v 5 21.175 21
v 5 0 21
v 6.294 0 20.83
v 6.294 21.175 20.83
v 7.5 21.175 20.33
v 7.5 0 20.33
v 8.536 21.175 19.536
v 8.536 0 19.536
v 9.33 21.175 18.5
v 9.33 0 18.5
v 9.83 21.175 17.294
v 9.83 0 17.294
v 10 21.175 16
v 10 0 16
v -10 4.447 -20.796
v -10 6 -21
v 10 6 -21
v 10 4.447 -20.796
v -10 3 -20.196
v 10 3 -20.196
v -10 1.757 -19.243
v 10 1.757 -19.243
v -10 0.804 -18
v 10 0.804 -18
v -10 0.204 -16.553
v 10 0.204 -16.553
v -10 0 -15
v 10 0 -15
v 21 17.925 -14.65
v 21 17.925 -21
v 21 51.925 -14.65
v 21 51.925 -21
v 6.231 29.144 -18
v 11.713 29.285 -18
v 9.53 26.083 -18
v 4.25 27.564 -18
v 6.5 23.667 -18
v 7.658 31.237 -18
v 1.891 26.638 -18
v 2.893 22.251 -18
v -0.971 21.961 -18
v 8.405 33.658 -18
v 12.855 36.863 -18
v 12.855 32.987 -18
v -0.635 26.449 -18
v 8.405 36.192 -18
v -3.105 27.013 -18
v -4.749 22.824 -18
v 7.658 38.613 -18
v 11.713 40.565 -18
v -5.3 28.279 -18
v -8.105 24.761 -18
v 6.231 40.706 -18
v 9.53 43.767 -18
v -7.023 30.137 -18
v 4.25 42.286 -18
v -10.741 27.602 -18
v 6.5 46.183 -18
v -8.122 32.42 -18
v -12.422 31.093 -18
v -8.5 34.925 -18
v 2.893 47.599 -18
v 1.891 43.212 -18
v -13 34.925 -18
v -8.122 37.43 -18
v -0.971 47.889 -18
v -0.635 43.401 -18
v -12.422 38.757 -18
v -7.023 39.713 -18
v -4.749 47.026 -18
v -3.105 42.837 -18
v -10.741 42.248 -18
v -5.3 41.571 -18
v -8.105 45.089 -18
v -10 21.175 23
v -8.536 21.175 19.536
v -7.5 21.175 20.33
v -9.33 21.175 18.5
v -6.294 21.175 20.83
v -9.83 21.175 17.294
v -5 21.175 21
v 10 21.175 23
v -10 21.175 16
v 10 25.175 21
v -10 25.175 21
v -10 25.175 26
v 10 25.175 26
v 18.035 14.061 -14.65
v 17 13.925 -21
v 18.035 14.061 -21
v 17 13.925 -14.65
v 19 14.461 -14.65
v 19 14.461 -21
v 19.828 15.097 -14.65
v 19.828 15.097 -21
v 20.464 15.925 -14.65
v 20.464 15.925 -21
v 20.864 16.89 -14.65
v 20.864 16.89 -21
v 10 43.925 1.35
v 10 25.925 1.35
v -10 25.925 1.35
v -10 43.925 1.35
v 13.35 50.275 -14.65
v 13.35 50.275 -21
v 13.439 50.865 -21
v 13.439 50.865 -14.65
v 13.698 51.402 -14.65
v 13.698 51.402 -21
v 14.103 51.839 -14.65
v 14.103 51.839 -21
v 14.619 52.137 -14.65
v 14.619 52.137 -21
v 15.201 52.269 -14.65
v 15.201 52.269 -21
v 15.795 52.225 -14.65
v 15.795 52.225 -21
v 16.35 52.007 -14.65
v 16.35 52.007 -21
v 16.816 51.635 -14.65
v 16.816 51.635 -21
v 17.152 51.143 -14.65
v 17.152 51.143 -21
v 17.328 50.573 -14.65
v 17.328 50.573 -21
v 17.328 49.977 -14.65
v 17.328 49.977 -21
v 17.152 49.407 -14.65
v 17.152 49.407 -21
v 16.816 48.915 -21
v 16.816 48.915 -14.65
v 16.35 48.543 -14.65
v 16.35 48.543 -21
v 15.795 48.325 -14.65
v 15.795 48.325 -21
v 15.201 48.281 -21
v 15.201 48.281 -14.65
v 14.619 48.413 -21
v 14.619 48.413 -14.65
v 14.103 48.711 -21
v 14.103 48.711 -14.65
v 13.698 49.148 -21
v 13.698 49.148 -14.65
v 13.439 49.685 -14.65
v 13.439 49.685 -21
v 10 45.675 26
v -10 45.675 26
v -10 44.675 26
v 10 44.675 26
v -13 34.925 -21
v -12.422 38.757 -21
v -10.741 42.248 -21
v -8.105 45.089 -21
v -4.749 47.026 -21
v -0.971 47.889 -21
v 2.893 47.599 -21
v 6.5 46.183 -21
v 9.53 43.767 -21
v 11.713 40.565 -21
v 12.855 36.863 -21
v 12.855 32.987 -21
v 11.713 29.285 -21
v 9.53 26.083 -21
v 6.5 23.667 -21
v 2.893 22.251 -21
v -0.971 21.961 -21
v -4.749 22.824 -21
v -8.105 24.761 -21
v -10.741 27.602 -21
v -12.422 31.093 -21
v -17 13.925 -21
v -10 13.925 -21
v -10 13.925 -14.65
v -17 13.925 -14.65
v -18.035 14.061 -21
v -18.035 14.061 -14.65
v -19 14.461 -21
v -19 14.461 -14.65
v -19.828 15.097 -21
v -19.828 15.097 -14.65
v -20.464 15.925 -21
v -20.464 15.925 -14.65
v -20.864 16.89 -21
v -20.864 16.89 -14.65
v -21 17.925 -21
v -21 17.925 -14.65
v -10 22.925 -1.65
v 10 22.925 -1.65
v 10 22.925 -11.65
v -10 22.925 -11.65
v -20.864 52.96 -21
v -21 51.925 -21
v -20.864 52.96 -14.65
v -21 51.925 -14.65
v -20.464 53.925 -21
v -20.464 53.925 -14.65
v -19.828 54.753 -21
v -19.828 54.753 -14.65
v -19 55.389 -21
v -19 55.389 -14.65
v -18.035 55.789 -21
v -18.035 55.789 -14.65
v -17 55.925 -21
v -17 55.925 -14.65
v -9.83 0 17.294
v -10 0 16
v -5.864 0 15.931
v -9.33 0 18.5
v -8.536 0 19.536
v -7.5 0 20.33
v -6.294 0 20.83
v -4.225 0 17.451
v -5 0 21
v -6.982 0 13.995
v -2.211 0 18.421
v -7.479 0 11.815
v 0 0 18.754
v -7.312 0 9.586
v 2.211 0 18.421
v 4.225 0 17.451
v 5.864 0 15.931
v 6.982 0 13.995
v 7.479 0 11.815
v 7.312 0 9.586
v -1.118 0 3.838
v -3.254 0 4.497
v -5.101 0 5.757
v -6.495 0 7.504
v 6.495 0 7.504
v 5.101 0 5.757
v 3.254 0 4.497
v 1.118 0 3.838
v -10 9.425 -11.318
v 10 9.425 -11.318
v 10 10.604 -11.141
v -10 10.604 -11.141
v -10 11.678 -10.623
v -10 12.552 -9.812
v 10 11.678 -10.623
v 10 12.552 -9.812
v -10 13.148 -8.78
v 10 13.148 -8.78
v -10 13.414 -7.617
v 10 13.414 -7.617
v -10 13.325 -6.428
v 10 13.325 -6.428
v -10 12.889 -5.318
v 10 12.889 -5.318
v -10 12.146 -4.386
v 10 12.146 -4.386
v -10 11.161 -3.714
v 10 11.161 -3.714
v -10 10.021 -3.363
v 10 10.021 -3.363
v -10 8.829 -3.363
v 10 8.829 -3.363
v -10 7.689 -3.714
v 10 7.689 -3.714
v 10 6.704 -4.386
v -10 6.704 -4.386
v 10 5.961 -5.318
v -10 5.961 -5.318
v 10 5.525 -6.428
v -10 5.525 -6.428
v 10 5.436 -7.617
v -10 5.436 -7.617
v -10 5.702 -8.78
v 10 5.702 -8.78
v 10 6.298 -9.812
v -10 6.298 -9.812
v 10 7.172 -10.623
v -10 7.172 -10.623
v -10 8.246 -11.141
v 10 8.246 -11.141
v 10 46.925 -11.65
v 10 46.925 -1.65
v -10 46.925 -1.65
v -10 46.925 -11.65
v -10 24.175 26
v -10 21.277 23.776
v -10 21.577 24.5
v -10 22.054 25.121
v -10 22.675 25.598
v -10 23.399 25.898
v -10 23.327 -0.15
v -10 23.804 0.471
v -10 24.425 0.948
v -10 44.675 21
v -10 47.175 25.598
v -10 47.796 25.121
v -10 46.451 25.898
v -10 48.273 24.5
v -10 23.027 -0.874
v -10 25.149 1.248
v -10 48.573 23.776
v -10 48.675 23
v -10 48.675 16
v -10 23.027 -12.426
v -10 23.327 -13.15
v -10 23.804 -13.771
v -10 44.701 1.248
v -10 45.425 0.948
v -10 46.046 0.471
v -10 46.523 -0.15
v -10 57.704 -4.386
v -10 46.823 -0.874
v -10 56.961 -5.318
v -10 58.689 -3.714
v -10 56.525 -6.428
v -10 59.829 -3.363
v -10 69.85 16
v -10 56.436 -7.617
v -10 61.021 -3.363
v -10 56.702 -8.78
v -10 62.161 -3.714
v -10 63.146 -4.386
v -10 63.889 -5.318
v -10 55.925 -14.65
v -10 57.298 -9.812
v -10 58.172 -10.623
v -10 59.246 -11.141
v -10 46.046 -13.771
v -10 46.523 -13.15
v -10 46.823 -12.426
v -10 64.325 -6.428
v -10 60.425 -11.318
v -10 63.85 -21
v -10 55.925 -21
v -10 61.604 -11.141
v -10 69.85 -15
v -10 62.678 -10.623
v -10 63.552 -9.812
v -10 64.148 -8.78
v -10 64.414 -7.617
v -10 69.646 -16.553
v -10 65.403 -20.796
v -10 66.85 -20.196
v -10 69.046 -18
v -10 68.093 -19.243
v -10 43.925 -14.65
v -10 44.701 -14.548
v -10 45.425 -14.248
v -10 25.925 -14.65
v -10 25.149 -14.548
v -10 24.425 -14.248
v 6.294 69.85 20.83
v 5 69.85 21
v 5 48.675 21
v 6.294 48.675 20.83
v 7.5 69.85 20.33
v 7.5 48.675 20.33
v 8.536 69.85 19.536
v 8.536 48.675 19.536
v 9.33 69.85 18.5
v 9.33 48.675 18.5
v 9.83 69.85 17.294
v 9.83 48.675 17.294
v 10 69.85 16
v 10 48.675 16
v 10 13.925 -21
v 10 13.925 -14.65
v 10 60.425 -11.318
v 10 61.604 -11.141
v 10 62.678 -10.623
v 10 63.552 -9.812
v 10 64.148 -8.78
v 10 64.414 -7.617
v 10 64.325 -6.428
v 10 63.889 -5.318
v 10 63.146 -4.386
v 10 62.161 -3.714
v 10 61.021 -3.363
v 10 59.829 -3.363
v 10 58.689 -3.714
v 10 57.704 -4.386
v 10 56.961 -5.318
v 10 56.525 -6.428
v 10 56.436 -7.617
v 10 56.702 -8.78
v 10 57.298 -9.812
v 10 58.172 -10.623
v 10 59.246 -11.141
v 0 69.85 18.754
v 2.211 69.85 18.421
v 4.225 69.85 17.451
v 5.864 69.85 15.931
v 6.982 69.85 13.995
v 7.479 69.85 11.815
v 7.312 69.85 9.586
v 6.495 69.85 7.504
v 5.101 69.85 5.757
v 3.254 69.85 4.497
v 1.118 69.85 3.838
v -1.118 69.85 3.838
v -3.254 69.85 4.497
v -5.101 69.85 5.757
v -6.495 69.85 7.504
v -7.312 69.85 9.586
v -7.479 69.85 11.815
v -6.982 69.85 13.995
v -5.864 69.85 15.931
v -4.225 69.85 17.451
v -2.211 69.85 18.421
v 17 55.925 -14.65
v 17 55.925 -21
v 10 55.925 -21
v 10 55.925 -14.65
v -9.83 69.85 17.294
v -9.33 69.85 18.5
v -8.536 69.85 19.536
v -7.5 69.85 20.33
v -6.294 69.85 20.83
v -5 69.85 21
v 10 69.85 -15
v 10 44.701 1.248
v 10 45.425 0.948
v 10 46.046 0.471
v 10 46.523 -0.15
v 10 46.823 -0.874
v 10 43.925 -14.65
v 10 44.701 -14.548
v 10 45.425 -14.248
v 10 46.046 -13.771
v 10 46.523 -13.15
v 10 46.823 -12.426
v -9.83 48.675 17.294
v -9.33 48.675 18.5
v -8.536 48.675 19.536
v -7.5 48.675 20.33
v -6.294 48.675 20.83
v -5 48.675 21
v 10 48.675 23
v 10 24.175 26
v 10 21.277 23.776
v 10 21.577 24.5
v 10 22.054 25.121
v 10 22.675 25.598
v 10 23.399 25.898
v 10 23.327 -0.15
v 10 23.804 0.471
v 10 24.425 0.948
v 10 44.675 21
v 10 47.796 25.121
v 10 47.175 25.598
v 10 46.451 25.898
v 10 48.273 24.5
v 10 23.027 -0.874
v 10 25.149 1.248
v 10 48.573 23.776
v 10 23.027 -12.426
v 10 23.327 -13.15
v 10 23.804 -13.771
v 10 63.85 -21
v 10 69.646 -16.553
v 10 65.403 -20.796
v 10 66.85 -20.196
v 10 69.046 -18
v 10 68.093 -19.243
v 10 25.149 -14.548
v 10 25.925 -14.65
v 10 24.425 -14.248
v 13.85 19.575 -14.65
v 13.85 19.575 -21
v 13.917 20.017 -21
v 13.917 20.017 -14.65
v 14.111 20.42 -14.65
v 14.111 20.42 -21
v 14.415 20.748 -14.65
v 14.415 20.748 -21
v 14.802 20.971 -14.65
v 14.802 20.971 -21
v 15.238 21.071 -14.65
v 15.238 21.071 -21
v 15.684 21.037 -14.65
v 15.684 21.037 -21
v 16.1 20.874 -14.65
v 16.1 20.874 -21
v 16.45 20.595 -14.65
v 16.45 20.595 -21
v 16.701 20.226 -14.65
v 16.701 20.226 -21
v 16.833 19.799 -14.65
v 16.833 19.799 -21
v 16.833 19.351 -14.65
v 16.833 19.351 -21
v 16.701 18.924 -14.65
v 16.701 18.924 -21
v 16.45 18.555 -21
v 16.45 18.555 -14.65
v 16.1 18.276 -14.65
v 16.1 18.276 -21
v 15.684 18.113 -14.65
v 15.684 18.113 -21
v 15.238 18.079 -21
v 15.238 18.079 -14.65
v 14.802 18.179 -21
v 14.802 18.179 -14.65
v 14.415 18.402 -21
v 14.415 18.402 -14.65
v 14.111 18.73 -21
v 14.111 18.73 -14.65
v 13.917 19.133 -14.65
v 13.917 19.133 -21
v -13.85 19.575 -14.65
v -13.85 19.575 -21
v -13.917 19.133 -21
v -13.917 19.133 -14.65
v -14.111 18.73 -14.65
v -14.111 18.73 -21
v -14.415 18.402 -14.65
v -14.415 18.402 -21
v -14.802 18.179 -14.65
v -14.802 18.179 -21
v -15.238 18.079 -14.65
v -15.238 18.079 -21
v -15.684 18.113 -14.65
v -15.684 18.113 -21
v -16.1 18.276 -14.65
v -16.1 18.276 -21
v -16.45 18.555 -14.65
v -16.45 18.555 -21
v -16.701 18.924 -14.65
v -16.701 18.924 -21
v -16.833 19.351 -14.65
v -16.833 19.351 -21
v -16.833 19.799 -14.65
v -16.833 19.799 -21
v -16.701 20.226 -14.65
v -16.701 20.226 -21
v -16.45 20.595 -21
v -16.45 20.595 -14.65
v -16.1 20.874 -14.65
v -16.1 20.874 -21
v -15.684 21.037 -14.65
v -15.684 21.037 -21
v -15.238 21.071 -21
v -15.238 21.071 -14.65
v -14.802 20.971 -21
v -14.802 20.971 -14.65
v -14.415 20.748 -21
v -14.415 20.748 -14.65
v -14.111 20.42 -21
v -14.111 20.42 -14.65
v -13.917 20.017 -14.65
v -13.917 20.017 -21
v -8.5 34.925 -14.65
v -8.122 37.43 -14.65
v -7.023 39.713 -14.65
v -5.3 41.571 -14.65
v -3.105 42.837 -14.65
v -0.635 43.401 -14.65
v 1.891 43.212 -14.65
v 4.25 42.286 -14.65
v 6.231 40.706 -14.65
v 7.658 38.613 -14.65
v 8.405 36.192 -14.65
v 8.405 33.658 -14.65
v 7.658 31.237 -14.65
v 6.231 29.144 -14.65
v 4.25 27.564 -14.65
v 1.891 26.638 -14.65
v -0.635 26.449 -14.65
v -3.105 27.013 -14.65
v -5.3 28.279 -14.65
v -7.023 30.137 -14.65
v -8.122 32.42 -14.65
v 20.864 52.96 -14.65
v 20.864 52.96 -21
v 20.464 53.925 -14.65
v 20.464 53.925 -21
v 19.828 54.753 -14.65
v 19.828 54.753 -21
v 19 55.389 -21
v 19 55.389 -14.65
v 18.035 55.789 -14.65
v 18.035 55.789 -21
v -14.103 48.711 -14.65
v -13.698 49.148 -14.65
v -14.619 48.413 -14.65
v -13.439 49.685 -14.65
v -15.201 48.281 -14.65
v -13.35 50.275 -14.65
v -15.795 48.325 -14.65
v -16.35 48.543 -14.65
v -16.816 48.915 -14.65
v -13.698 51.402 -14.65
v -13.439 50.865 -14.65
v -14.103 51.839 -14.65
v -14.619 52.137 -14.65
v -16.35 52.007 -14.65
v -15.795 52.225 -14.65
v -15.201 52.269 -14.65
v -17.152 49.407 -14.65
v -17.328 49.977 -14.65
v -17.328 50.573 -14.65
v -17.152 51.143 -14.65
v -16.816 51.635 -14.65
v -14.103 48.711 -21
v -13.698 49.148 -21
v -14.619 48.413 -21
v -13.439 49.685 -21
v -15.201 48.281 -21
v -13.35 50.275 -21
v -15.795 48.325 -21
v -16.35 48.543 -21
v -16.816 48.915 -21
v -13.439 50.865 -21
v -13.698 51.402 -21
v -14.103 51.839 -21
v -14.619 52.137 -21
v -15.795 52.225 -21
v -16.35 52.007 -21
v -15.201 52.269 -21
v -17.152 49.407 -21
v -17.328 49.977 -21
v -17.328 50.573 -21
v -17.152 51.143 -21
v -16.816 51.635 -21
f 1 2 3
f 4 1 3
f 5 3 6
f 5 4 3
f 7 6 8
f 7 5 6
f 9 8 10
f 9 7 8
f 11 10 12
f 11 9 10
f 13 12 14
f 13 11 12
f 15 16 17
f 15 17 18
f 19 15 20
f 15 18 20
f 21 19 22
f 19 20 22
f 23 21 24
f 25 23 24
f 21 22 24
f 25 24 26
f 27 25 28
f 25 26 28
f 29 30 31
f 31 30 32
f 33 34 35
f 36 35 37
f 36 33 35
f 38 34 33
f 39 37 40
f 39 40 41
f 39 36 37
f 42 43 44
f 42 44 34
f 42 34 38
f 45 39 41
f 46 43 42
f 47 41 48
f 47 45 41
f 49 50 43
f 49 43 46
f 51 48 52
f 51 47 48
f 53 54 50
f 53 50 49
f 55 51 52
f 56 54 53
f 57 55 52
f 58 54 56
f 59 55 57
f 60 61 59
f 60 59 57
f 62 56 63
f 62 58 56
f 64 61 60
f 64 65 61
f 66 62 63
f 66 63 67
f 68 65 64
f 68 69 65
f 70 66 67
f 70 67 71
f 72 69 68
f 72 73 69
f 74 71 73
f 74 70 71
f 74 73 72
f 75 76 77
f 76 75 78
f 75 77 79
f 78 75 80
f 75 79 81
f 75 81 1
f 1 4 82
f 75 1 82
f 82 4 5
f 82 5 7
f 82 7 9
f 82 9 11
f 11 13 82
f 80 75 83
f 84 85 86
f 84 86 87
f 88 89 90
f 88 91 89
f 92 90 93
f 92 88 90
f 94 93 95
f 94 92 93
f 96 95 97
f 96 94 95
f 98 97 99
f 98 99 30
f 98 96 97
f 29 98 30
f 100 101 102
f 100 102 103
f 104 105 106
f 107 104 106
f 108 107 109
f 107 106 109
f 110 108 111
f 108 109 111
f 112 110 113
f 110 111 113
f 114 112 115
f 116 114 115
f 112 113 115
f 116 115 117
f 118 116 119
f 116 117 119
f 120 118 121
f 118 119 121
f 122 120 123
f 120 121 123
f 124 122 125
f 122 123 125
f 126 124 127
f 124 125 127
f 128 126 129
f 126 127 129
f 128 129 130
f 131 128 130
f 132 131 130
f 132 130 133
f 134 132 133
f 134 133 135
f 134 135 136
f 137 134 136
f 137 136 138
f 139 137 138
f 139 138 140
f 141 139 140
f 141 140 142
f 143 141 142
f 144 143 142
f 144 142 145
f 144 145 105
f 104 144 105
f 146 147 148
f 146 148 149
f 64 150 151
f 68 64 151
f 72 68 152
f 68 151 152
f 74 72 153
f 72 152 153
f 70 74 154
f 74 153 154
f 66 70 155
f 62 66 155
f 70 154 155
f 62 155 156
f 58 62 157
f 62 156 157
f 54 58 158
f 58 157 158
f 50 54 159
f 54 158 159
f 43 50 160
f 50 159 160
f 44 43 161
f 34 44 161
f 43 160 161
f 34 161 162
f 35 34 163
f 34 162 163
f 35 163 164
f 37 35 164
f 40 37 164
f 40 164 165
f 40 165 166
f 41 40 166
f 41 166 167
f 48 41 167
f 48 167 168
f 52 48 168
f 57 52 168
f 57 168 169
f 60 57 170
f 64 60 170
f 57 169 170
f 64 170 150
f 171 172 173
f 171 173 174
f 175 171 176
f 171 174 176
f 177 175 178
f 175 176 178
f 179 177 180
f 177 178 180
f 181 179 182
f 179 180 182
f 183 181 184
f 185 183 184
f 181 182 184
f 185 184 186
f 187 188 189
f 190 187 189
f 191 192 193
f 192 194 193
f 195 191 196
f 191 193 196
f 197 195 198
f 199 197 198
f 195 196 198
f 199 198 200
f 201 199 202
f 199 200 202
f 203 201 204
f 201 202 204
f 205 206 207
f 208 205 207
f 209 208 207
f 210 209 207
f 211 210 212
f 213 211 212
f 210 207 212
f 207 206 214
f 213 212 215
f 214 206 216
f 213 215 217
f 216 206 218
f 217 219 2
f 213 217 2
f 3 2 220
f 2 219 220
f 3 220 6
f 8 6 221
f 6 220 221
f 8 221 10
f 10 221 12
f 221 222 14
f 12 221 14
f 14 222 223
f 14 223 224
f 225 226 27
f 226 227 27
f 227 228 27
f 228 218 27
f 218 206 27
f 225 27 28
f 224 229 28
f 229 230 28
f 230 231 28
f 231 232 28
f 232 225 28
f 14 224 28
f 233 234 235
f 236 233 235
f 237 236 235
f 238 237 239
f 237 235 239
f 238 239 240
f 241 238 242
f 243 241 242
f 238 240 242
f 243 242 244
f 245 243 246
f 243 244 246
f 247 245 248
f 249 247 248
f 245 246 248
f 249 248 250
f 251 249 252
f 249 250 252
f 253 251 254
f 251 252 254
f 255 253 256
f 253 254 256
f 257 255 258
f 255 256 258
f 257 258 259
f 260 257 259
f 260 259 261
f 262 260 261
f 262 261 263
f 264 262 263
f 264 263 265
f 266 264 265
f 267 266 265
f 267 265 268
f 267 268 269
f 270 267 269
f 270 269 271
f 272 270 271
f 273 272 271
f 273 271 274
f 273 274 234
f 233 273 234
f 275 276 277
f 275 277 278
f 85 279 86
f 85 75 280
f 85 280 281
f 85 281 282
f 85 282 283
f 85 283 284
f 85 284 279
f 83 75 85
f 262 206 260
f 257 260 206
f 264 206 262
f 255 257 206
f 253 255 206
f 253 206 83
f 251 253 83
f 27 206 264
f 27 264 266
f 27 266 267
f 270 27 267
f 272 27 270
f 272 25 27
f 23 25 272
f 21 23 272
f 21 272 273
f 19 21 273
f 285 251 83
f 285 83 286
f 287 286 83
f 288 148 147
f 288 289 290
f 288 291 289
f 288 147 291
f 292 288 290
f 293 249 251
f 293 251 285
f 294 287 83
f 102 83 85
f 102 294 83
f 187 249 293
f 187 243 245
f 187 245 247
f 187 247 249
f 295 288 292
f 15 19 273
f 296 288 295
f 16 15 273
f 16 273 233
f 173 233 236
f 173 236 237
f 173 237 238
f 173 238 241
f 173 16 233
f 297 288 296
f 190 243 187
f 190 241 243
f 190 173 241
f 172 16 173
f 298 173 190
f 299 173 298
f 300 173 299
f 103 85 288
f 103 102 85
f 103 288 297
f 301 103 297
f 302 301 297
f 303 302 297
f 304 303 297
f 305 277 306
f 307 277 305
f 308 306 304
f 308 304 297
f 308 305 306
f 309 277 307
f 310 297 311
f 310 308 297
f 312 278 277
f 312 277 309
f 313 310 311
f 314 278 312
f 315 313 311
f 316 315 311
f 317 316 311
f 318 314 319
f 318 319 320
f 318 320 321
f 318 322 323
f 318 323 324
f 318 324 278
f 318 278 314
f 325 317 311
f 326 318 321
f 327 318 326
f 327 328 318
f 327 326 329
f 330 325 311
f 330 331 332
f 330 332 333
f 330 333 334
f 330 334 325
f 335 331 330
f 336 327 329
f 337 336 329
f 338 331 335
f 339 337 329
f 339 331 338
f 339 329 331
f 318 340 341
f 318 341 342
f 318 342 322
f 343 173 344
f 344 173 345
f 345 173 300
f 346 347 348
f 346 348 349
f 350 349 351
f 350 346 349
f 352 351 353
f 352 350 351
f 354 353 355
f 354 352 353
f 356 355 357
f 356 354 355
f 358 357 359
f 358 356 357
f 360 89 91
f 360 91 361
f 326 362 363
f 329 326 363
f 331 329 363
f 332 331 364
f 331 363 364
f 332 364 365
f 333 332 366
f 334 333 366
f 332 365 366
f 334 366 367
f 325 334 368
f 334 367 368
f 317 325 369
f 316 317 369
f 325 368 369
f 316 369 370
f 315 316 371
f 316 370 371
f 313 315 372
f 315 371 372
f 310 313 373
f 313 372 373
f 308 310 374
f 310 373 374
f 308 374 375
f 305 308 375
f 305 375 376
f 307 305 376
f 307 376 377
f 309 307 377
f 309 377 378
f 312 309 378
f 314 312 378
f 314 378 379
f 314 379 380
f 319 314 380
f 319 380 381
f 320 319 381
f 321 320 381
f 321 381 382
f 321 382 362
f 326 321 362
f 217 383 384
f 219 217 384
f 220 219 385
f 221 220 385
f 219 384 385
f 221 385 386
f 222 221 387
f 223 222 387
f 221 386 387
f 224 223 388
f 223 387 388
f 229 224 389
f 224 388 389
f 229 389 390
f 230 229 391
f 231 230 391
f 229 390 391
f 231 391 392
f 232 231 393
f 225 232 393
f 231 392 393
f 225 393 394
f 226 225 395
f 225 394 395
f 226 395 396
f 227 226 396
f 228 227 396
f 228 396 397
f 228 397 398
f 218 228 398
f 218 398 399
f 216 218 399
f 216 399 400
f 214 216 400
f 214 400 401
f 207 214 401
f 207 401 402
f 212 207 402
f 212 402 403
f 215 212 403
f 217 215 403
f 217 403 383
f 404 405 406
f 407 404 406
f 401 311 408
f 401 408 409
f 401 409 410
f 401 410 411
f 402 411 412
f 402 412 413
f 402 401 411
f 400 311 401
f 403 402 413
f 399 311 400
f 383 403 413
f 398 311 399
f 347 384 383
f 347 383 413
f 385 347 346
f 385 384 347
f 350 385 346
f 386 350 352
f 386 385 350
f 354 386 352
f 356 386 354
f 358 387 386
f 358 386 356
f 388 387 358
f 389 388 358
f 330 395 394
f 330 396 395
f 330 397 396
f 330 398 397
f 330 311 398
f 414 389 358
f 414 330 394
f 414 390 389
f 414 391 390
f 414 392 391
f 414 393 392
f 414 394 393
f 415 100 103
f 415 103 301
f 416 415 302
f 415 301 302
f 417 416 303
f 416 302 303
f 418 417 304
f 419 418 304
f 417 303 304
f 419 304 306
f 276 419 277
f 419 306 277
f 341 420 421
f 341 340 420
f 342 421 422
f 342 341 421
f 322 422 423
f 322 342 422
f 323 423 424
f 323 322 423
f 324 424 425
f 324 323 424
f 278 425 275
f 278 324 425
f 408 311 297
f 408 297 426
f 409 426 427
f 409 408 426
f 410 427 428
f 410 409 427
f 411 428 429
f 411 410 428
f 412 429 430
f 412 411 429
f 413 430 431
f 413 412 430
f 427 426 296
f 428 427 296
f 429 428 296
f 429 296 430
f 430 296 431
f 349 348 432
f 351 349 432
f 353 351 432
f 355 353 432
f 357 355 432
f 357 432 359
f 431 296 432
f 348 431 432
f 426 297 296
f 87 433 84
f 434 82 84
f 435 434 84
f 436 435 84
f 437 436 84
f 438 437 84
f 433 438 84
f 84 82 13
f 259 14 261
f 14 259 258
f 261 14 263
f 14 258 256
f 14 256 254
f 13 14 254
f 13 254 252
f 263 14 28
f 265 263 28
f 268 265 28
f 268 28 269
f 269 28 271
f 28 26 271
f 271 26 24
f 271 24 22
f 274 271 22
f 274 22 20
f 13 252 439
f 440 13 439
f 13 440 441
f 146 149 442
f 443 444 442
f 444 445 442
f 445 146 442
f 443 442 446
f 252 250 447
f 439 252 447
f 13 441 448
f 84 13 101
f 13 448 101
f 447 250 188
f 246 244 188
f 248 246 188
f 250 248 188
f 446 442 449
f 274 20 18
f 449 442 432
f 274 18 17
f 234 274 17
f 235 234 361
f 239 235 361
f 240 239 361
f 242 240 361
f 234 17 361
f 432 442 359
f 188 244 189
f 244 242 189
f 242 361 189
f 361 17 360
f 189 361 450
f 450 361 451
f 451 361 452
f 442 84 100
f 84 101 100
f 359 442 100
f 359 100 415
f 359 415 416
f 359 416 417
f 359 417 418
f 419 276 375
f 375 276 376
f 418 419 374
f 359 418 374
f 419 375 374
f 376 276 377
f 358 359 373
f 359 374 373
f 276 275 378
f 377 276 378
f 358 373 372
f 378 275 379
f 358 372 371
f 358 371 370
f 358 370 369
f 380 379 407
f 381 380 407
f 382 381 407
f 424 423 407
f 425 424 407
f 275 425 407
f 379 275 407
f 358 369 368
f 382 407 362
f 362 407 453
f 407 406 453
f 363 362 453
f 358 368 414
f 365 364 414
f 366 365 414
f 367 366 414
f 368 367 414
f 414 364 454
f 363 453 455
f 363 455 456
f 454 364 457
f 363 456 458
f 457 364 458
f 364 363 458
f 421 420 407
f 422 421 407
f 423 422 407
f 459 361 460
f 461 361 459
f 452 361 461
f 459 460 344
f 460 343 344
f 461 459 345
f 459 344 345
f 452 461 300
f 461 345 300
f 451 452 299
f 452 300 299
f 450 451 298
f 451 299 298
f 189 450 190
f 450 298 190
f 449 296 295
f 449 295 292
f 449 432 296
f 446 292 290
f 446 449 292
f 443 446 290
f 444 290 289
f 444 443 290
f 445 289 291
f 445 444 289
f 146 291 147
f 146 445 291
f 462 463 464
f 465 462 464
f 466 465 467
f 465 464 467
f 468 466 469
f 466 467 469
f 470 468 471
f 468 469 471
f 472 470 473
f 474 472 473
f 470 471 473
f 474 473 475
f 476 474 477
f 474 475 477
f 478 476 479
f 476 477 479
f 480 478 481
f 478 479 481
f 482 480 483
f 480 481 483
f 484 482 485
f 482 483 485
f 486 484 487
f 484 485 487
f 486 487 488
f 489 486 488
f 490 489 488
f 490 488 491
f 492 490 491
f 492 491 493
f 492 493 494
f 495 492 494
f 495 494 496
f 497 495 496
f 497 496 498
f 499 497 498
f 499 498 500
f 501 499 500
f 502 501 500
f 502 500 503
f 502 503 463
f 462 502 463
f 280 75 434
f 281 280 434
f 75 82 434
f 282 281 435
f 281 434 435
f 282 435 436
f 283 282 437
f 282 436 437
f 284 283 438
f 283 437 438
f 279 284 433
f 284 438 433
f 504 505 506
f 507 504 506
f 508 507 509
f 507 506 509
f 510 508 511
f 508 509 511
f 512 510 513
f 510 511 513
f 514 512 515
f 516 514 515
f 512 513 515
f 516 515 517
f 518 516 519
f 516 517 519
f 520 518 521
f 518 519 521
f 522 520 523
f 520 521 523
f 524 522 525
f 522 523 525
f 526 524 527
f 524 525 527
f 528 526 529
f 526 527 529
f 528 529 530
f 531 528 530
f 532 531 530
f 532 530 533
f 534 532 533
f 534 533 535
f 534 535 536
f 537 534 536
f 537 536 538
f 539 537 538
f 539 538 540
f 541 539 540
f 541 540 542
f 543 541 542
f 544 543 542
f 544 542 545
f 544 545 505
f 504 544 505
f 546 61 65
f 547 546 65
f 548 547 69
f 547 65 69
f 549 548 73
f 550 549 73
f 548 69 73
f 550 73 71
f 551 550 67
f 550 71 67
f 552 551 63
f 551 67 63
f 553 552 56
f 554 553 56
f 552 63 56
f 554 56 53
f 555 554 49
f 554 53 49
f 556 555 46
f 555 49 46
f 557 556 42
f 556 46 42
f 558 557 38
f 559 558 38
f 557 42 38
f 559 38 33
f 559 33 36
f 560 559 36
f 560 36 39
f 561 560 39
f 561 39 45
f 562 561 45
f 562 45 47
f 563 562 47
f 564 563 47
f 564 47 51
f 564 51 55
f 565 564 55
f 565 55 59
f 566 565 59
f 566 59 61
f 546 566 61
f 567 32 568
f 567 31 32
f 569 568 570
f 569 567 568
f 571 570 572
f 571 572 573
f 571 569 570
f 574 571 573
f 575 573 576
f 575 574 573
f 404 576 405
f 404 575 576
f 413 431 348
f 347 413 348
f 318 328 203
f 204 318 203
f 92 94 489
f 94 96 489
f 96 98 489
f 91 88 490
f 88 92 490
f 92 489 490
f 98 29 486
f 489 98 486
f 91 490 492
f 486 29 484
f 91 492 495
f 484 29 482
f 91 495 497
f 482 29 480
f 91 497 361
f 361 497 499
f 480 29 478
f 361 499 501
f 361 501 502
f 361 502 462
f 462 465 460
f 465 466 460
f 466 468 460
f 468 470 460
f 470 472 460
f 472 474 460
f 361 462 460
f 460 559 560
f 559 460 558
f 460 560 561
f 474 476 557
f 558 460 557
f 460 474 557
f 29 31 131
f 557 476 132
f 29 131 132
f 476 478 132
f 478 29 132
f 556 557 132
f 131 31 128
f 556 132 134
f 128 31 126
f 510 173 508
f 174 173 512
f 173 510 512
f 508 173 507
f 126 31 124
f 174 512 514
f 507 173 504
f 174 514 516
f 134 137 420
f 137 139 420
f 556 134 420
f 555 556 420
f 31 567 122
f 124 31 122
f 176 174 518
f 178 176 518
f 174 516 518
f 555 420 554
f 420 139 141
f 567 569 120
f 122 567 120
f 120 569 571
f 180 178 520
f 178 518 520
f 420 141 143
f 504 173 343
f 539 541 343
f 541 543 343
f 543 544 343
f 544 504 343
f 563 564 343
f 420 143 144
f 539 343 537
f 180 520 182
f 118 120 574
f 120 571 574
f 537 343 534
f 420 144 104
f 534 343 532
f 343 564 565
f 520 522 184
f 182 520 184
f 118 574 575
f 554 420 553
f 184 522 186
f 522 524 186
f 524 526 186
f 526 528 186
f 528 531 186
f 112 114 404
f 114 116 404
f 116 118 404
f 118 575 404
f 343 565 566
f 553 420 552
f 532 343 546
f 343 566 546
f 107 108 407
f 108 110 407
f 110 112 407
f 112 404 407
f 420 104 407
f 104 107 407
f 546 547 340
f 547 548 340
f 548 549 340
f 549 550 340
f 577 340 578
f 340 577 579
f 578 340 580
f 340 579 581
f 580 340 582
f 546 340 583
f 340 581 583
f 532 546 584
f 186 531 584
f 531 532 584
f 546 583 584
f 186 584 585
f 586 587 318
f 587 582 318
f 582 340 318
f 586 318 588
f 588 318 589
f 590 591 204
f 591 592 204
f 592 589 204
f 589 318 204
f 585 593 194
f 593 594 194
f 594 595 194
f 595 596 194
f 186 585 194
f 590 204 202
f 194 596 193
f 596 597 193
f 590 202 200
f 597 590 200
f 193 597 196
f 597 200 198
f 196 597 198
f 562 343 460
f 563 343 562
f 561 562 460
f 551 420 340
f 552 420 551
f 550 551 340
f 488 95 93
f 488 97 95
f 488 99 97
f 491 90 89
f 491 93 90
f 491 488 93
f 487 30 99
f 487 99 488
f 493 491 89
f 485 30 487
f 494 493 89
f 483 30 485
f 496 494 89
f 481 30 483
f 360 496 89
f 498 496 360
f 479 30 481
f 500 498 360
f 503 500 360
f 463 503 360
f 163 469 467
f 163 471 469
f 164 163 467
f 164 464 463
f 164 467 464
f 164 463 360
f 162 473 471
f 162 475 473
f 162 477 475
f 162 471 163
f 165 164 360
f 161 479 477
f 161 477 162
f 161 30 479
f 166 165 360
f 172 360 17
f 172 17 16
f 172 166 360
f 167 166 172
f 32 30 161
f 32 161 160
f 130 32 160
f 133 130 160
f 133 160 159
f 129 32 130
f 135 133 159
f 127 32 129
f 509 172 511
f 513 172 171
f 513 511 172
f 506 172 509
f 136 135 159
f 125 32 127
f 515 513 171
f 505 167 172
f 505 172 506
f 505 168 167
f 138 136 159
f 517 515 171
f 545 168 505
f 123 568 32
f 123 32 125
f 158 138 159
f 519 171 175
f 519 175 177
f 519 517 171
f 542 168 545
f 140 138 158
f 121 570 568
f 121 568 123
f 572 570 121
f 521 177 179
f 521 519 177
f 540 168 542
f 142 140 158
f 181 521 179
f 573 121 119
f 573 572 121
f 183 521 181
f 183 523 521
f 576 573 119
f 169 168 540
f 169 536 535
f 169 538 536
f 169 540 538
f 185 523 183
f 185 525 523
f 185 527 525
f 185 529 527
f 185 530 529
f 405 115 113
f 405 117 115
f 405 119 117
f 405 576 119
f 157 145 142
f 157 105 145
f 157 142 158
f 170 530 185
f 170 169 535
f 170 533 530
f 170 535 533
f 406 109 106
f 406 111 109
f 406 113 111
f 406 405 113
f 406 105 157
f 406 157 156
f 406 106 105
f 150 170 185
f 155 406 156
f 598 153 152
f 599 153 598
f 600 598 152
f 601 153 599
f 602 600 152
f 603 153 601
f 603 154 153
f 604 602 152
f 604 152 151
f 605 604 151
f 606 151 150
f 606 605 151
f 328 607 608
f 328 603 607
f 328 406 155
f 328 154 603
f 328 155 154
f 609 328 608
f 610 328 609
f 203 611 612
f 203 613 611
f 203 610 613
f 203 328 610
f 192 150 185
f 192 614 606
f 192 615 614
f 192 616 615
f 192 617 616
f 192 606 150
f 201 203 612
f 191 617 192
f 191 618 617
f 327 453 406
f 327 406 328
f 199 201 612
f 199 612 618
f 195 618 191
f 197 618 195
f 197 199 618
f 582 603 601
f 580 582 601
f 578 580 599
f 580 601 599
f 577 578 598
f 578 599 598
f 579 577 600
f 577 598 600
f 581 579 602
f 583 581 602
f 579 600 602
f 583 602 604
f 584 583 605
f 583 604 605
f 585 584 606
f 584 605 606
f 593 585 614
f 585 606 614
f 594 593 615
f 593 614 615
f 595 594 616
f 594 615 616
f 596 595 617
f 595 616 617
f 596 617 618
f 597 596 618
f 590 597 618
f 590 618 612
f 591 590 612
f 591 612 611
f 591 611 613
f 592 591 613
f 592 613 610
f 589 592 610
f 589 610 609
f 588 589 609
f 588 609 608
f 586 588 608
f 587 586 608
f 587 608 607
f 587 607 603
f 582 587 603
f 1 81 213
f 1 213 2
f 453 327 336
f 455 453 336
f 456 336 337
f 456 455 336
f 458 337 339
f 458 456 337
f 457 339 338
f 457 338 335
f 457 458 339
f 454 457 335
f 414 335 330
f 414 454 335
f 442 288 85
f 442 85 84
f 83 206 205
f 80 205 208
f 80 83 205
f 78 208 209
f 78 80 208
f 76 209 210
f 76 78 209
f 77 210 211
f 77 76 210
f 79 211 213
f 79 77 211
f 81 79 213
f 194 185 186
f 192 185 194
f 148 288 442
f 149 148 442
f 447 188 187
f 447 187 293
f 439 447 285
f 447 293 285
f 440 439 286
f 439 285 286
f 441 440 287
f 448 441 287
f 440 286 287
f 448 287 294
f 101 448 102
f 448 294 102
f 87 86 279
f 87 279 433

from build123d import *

# Parameters (mm, degrees)
SKETCH1_W           = 20
SKETCH1_H           = 42
BOSS_EXTRUDE1_DEPTH = 69.85
FILLET1_R           = 5
SKETCH3_W           = 42
SKETCH3_H           = 42
BOSS_EXTRUDE2_DEPTH = 6.35
SKETCH4_W           = 16
SKETCH4_H           = 24
CUT_EXTRUDE2_DEPTH  = 80.252902155
SKETCH5_R           = 13
CUT_EXTRUDE3_DEPTH  = 3
CUT_EXTRUDE4_REACH  = 84.71
SKETCH7_R           = 8.5
SKETCH8_R           = 4
CUT_EXTRUDE5_DEPTH  = 80.252902155
FILLET2_R           = 6
FILLET3_R           = 4
FILLET4_R           = 3
SKETCH9_W           = 20
SKETCH9_H           = 27.5
BOSS_EXTRUDE3_DEPTH = 6.35
SKETCH2_R           = 7.5
CUT_EXTRUDE1_DEPTH  = 76.901399855
SKETCH10_W          = 20
SKETCH10_H          = 4
BOSS_EXTRUDE4_DEPTH = 5
FILLET6_R           = 3
SKETCH11_R          = 2
SKETCH11_R_2        = 1.5
CUT_EXTRUDE6_DEPTH  = 7


with BuildPart() as part:
    # Sketch1 → Boss-Extrude1 (new body)
    with BuildSketch(Plane(origin=(0, 0, 0), x_dir=(1, 0, 0), z_dir=(0, 1, 0))):
        Rectangle(SKETCH1_W, SKETCH1_H)
    extrude(amount=BOSS_EXTRUDE1_DEPTH)

    # Fillet1
    fillet1_edges = [part.edges().sort_by_distance(p)[0] for p in [
        (10, 34.925, 21),
        (-10, 34.925, 21),
    ]]
    fillet(fillet1_edges, radius=FILLET1_R)

    # Sketch3 → Boss-Extrude2 (add)
    with BuildSketch(Plane(origin=(0, 0, -21), x_dir=(-1, 0, 0), z_dir=(0, 0, -1))):
        with Locations((0, 34.925)):
            Rectangle(SKETCH3_W, SKETCH3_H)
    extrude(amount=-BOSS_EXTRUDE2_DEPTH)

    # Sketch4 → Cut-Extrude2 (cut, through all)
    with BuildSketch(Plane(origin=(10, 0, 0), x_dir=(0, 0, -1), z_dir=(1, 0, 0))):
        with Locations((6.65, 34.925)):
            Rectangle(SKETCH4_W, SKETCH4_H)
    extrude(amount=-CUT_EXTRUDE2_DEPTH, mode=Mode.SUBTRACT)

    # Sketch5 → Cut-Extrude3 (cut)
    with BuildSketch(Plane(origin=(0, 0, -21), x_dir=(-1, 0, 0), z_dir=(0, 0, -1))):
        with Locations((0, 34.925)):
            Circle(SKETCH5_R)
    extrude(amount=-CUT_EXTRUDE3_DEPTH, mode=Mode.SUBTRACT)

    # Sketch7 → Cut-Extrude4 (cut, up to next)
    with BuildSketch(Plane(origin=(0, 0, -18), x_dir=(-1, 0, 0), z_dir=(0, 0, -1)), mode=Mode.PRIVATE) as cut_extrude4_sk1:
        with Locations((0, 34.925)):
            Circle(SKETCH7_R)
    cut_extrude4_tool1 = extrude(cut_extrude4_sk1.sketch, amount=-CUT_EXTRUDE4_REACH, mode=Mode.PRIVATE) & part.part
    add(cut_extrude4_tool1.solids().sort_by_distance((0, 34.925, -18))[0], mode=Mode.SUBTRACT)

    # Sketch8 → Cut-Extrude5 (cut, through all)
    with BuildSketch(Plane(origin=(10, 0, 0), x_dir=(0, 0, -1), z_dir=(1, 0, 0))):
        with Locations((7.318215362, 60.425)):
            Circle(SKETCH8_R)
        with Locations((7.318215362, 9.425)):
            Circle(SKETCH8_R)
    extrude(amount=-CUT_EXTRUDE5_DEPTH, mode=Mode.SUBTRACT)

    # Fillet2
    fillet2_edges = [part.edges().sort_by_distance(p)[0] for p in [
        (0, 0, -21),
        (0, 69.85, -21),
    ]]
    fillet(fillet2_edges, radius=FILLET2_R)

    # Fillet3
    fillet3_edges = [part.edges().sort_by_distance(p)[0] for p in [
        (-21, 13.925, -17.825),
        (21, 55.925, -17.825),
        (-21, 55.925, -17.825),
        (21, 13.925, -17.825),
    ]]
    fillet(fillet3_edges, radius=FILLET3_R)

    # Fillet4
    fillet4_edges = [part.edges().sort_by_distance(p)[0] for p in [
        (0, 22.925, 1.35),
        (0, 46.925, -14.65),
        (0, 46.925, 1.35),
        (0, 22.925, -14.65),
    ]]
    fillet(fillet4_edges, radius=FILLET4_R)

    # Sketch9 → Boss-Extrude3 (add)
    with BuildSketch(Plane.XY.offset(21)):
        with Locations((0, 34.925)):
            Rectangle(SKETCH9_W, SKETCH9_H)
    extrude(amount=-BOSS_EXTRUDE3_DEPTH)

    # Sketch2 → Cut-Extrude1 (cut, through all)
    with BuildSketch(Plane(origin=(0, 69.85, 0), x_dir=(1, 0, 0), z_dir=(0, 1, 0))):
        with Locations(Location((0, -11.254449914, 0), (0, 0, 270))):
            Circle(SKETCH2_R)
    extrude(amount=-CUT_EXTRUDE1_DEPTH, mode=Mode.SUBTRACT)

    # Sketch10 → Boss-Extrude4 (add)
    with BuildSketch(Plane.XY.offset(21)):
        with Locations((0, 23.175)):
            Rectangle(SKETCH10_W, SKETCH10_H)
        with Locations((0, 46.675)):
            Rectangle(SKETCH10_W, SKETCH10_H)
    extrude(amount=BOSS_EXTRUDE4_DEPTH)

    # Fillet6
    fillet6_edges = [part.edges().sort_by_distance(p)[0] for p in [
        (0, 21.175, 26),
        (0, 48.675, 26),
    ]]
    fillet(fillet6_edges, radius=FILLET6_R)

    # Sketch11 → Cut-Extrude6 (cut)
    with BuildSketch(Plane(origin=(85.430800997, 34.822301654, -21), x_dir=(-1, 0, 0), z_dir=(0, 0, -1))):
        with Locations((70.080800997, 15.452698346)):
            Circle(SKETCH11_R)
        with Locations(Location((100.780800997, -15.247301654, 0), (0, 0, 180))):
            Circle(SKETCH11_R_2)
        with Locations((70.080800997, -15.247301654)):
            Circle(SKETCH11_R_2)
        with Locations(Location((100.780800997, 15.452698346, 0), (0, 0, 180))):
            Circle(SKETCH11_R)
    extrude(amount=-CUT_EXTRUDE6_DEPTH, mode=Mode.SUBTRACT)


solid = part.part
